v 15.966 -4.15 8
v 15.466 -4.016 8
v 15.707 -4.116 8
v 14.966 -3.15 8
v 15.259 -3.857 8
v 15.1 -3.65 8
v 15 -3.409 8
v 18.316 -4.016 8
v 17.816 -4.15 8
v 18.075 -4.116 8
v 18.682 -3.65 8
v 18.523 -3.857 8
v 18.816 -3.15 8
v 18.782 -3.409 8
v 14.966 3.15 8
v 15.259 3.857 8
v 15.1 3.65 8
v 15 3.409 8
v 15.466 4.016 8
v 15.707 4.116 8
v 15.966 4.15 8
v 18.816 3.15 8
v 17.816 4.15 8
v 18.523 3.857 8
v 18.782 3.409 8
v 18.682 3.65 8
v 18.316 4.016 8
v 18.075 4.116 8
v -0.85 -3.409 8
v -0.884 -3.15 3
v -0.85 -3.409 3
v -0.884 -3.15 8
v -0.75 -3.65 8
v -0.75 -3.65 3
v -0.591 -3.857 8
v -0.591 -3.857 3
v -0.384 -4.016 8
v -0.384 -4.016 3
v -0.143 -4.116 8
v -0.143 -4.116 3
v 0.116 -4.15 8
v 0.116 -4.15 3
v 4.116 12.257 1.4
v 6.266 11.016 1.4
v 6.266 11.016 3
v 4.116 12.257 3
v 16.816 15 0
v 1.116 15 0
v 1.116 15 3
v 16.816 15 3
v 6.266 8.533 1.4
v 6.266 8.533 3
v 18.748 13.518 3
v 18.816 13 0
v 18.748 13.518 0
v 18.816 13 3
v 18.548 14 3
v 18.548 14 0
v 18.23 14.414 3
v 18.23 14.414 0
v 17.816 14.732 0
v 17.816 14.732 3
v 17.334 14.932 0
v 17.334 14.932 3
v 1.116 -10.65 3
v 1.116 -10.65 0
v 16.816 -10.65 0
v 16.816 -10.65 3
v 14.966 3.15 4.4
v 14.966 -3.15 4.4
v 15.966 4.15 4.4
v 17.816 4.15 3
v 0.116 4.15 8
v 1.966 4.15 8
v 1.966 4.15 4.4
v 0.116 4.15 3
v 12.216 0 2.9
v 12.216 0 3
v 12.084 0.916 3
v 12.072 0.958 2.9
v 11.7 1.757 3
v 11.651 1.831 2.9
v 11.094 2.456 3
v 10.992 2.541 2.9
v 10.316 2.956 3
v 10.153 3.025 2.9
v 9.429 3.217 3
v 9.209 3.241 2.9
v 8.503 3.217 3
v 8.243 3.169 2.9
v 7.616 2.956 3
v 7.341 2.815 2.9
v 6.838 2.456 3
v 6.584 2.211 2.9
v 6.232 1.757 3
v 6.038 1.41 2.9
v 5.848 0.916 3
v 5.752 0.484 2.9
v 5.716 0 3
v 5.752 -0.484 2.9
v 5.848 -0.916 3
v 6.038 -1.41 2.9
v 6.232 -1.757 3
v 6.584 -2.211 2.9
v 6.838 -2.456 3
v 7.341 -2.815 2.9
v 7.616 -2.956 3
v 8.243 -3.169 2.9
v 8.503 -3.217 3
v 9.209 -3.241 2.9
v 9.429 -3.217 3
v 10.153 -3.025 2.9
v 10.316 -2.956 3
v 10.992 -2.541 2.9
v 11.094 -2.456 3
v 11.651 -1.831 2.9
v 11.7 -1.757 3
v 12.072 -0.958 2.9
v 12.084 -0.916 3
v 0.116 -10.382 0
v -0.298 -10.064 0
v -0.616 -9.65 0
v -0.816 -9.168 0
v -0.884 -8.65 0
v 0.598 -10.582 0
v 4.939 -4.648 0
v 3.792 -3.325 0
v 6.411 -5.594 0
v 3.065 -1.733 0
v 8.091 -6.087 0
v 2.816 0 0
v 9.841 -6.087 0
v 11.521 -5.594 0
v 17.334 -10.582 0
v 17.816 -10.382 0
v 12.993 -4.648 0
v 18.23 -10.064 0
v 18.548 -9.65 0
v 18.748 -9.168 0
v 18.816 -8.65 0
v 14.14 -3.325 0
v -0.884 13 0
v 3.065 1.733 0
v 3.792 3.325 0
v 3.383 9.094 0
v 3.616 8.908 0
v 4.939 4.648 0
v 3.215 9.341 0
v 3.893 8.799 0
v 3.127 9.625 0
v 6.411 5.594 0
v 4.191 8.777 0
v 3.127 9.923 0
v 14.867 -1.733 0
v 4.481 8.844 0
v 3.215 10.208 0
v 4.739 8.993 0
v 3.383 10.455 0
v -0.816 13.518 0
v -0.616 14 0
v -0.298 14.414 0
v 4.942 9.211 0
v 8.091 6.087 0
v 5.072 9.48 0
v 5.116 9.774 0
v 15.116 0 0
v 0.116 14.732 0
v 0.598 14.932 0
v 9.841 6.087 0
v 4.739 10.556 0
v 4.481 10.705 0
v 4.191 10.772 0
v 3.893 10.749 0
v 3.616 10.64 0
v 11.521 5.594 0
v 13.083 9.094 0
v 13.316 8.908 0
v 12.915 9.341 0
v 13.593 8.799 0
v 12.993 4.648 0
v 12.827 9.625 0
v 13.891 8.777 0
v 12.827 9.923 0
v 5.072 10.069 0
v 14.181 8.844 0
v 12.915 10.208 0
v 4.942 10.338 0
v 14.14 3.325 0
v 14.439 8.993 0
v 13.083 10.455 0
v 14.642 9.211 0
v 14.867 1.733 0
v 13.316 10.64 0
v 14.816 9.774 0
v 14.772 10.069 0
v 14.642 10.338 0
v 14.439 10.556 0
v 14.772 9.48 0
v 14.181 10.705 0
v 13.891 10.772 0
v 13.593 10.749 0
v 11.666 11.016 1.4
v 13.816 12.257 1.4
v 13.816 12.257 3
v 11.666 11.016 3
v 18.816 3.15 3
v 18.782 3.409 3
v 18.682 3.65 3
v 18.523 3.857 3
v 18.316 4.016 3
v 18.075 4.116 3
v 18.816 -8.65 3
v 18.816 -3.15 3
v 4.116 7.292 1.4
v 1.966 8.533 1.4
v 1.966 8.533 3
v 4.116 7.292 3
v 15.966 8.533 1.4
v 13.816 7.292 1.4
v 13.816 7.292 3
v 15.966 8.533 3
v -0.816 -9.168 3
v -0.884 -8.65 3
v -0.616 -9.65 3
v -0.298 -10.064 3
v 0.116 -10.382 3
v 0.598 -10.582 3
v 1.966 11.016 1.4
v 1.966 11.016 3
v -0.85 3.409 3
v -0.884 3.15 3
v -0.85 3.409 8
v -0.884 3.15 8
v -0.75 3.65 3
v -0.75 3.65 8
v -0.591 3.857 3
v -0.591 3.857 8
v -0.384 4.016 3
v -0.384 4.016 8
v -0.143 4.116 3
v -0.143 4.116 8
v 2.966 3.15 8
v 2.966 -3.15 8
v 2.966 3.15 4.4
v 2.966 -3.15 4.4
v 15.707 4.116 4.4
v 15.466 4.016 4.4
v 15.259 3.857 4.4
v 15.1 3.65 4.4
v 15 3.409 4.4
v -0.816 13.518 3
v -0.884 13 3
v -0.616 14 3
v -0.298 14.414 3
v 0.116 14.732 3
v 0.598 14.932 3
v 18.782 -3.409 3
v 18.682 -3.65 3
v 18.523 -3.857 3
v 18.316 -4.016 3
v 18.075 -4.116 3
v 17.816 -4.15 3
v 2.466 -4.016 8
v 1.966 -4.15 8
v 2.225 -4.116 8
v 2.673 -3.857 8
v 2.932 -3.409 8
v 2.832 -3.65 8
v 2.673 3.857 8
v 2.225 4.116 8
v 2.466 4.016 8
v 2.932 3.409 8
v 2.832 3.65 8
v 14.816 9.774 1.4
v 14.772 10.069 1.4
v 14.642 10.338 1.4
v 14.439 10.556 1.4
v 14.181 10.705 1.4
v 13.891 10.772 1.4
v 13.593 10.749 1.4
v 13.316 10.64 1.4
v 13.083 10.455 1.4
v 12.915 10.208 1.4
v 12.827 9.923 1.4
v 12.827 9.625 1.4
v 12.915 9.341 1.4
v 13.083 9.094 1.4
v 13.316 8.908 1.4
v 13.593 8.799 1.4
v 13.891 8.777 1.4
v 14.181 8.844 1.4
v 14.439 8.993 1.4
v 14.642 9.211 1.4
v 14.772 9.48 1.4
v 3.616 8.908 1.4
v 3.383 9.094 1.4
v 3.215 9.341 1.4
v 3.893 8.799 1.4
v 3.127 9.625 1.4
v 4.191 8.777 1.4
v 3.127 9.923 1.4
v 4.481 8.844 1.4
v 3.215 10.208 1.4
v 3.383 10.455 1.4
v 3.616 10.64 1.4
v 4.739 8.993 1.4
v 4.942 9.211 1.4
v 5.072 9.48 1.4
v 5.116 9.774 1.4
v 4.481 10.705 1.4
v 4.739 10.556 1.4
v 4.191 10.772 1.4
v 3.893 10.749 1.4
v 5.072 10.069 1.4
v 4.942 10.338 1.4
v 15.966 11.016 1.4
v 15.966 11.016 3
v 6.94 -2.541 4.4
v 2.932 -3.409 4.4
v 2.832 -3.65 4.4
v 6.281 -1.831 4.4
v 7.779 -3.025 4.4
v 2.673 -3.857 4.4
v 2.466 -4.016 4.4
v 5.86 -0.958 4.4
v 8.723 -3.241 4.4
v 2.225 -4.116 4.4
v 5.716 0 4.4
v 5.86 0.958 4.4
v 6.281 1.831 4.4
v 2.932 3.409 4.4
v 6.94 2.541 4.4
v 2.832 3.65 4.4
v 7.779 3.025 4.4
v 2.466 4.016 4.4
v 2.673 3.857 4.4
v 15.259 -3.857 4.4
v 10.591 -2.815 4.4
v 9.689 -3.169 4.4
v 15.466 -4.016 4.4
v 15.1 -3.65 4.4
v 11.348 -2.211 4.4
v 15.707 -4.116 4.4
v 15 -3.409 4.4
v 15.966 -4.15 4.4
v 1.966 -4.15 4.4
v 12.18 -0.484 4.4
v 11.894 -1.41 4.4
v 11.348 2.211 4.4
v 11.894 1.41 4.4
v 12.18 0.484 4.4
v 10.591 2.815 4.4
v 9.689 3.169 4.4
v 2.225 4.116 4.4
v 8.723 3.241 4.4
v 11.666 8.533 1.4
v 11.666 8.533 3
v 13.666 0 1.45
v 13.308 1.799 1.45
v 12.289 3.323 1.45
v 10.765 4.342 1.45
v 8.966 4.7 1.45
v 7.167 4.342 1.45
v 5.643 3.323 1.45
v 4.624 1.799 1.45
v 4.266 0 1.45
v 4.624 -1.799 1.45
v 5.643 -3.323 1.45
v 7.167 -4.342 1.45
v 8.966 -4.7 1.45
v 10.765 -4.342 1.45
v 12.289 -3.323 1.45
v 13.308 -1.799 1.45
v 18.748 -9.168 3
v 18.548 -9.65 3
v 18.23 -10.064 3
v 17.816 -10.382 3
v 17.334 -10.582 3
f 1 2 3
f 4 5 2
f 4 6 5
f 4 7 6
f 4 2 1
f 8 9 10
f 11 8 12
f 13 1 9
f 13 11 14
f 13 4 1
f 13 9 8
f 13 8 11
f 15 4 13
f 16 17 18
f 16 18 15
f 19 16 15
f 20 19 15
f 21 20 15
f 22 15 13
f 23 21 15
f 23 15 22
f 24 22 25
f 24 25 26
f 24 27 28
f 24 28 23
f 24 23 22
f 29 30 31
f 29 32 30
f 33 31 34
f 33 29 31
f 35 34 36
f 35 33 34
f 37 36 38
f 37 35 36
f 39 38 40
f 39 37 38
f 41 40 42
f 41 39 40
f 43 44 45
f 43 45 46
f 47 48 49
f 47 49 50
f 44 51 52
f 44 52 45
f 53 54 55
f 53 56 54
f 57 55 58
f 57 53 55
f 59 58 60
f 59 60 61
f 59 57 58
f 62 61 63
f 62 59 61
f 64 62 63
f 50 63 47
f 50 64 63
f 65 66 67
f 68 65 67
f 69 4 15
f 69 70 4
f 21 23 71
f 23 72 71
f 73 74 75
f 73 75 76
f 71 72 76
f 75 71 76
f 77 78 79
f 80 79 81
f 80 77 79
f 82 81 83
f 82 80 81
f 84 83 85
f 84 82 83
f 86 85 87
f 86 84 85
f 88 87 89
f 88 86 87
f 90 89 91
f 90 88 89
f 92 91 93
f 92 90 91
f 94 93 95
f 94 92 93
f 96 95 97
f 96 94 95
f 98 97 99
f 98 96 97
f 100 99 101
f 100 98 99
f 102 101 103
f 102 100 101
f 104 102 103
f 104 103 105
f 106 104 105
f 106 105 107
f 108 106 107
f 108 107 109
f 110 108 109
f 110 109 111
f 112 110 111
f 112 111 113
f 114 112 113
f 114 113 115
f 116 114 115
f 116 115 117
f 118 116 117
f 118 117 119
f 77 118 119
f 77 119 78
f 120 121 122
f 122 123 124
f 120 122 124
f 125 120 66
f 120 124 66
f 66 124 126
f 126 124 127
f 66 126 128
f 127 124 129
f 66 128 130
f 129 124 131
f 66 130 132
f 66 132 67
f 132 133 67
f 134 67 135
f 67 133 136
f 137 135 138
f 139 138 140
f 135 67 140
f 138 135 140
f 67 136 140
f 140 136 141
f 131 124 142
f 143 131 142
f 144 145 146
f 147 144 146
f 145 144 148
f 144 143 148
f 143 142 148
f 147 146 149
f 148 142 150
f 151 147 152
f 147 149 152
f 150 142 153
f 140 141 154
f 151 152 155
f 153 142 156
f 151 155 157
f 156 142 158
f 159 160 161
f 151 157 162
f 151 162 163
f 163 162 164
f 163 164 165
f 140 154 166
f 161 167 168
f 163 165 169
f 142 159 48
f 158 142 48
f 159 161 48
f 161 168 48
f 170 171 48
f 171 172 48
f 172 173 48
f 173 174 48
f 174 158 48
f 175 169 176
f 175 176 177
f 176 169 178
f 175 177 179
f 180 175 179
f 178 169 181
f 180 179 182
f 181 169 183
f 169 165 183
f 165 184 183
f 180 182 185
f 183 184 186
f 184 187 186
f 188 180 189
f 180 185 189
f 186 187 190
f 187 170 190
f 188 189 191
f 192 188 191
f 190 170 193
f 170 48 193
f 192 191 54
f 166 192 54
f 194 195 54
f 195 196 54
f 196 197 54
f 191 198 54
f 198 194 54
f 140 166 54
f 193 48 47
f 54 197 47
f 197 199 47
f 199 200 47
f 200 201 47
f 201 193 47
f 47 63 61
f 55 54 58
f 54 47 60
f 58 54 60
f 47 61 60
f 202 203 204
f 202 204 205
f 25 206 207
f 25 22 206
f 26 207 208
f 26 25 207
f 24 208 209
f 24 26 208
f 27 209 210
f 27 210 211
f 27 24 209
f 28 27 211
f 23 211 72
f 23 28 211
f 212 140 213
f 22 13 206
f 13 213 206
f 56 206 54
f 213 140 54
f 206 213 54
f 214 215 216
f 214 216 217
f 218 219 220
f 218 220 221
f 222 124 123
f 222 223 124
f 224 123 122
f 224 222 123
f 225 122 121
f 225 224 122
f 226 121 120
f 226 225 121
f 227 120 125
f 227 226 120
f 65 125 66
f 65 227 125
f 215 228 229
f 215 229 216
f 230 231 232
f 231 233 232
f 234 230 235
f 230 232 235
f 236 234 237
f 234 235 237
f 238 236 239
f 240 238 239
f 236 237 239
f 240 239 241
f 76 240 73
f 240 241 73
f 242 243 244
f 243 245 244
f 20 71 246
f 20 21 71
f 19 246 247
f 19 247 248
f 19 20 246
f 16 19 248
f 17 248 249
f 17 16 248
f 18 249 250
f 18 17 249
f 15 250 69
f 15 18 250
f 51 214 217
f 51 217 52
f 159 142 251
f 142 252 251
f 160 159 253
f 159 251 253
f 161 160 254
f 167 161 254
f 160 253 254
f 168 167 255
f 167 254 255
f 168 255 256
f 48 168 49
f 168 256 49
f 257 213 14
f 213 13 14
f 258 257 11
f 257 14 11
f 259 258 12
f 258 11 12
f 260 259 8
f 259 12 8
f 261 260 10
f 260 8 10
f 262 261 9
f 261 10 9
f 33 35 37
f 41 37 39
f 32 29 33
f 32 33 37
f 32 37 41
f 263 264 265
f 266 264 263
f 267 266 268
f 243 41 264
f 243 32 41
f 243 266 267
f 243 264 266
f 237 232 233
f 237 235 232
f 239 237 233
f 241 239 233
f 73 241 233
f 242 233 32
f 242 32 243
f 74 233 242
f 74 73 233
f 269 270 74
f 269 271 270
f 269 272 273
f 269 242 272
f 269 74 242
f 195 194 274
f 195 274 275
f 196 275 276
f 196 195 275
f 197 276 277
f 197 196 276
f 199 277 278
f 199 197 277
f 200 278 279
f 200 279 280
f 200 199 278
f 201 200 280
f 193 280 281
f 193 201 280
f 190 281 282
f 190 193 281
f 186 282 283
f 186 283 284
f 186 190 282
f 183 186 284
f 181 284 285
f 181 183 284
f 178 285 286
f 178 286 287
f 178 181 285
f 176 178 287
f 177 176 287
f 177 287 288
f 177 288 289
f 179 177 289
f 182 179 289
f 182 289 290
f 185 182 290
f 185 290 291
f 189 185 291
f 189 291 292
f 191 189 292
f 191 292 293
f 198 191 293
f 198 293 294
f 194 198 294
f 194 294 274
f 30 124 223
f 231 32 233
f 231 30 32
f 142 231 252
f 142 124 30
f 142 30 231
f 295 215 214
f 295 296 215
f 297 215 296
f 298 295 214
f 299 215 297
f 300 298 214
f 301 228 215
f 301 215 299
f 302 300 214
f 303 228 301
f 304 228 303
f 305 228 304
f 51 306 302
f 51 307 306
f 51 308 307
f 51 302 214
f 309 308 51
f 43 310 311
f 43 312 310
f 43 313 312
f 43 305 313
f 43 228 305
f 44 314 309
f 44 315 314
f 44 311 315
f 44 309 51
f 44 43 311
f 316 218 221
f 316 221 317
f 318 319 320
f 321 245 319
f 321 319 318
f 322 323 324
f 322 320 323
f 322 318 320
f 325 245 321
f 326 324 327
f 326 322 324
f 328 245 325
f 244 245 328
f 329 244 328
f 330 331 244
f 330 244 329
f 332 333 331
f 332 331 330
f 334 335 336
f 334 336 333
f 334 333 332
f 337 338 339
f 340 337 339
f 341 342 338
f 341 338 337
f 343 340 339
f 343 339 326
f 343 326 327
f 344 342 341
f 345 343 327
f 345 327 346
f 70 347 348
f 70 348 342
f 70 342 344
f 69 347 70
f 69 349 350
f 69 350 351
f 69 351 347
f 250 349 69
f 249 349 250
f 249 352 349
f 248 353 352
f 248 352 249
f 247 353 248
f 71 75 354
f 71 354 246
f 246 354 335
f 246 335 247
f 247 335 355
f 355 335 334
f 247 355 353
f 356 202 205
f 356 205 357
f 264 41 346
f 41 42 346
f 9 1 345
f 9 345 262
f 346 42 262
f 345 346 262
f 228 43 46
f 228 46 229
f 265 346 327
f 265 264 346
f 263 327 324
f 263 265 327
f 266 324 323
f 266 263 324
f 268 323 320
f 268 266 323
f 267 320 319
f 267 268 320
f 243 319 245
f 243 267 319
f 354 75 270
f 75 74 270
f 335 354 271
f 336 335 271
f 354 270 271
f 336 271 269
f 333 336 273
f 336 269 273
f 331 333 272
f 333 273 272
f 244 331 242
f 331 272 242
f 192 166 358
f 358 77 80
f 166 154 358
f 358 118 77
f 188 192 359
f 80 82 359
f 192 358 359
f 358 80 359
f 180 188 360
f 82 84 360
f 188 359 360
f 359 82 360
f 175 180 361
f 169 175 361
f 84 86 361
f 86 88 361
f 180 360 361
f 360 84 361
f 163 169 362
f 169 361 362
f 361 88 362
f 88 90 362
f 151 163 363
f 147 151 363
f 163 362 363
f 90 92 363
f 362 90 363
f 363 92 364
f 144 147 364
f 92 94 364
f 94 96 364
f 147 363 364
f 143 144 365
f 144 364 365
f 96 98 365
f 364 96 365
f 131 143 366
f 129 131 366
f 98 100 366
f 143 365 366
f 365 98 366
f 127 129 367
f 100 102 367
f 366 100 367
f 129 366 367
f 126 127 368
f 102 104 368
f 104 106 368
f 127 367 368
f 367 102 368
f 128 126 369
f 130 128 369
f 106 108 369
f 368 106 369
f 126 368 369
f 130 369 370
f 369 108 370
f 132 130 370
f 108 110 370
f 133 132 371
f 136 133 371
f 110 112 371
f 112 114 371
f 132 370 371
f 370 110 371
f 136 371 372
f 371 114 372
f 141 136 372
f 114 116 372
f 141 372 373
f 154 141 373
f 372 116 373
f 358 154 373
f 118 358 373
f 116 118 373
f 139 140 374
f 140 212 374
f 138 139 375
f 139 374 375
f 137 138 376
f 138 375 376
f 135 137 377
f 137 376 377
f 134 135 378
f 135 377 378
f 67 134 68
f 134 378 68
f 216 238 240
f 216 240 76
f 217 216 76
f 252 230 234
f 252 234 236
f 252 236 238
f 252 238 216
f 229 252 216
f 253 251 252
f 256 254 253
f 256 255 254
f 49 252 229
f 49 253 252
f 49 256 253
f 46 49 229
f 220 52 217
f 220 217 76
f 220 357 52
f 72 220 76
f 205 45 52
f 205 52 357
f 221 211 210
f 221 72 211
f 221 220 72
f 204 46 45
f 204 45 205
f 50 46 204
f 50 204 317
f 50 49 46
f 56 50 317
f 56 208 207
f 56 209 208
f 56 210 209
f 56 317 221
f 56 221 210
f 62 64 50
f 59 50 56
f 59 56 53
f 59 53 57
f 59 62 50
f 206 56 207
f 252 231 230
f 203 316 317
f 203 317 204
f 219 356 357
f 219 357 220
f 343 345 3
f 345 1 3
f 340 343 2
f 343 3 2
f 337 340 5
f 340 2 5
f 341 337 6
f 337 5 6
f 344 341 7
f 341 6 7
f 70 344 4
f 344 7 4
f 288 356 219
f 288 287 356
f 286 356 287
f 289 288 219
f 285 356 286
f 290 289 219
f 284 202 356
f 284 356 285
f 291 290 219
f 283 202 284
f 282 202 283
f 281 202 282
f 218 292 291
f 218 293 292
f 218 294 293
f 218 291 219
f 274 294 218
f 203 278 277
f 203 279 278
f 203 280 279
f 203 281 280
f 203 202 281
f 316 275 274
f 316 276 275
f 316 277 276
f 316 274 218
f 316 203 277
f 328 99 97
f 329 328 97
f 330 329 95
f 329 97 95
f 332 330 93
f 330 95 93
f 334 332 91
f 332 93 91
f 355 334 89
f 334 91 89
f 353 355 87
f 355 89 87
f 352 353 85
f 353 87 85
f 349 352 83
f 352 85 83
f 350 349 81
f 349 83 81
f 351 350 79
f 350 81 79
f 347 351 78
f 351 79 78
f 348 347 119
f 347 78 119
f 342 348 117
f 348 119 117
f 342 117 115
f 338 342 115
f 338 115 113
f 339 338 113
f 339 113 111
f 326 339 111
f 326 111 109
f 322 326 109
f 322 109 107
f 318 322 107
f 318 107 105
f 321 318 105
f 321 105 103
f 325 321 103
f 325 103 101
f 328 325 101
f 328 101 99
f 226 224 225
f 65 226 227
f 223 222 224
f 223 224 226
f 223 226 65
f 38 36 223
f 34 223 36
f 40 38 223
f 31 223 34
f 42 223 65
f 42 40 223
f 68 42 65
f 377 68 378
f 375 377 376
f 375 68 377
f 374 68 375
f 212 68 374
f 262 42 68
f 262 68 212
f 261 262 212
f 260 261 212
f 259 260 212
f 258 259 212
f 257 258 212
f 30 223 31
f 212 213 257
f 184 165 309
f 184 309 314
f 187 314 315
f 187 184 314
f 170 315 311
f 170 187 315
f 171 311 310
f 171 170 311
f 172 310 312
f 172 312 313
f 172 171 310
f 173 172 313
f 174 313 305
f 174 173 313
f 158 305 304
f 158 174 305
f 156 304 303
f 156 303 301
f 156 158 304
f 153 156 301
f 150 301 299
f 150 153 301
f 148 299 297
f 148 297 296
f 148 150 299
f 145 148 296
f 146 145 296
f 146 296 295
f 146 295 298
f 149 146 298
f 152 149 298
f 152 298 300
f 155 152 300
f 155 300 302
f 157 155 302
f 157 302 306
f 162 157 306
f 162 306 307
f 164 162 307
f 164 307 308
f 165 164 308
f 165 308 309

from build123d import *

# Parameters (mm, degrees)
SKETCH_1_W          = 19.7
SKETCH_1_H          = 25.65
SKETCH_1_R          = 3.25
SKETCH_1_R_2        = 1
EXTRUDE_1_DEPTH     = 3
SKETCH_1_3_W        = 3.85
SKETCH_1_3_H        = 8.3
EXTRUDE_2_DEPTH     = 8
FILLET_1_R          = 2
CHAMFER_1_SIZE      = 2.9
FILLET_2_R          = 1
EXTRUDE_START       = 3
EXTRUDE_4_DEPTH     = 1.4
FILLET_3_R          = 1
CUT_EXTRUDE_START   = 1.4
SKETCH_1_5_R        = 1
CUT_EXTRUDE_1_DEPTH = 1.6


with BuildPart() as part:
    # Эскиз1 → Бобышка-Вытянуть1 (new body)
    with BuildSketch(Plane.XY):
        with Locations((8.965987089, 2.175)):
            Rectangle(SKETCH_1_W, SKETCH_1_H)
        with Locations((8.965987089, 0)):
            Circle(SKETCH_1_R, mode=Mode.SUBTRACT)
        with Locations((4.115987089, 9.774393406)):
            Circle(SKETCH_1_R_2, mode=Mode.SUBTRACT)
        with Locations((13.815987089, 9.774393406)):
            Circle(SKETCH_1_R_2, mode=Mode.SUBTRACT)
    extrude(amount=EXTRUDE_1_DEPTH)

    # Эскиз1<3> → Бобышка-Вытянуть2 (add)
    with BuildSketch(Plane.XY):
        with Locations((1.040987089, 0)):
            Rectangle(SKETCH_1_3_W, SKETCH_1_3_H)
        with Locations((16.890987089, 0)):
            Rectangle(SKETCH_1_3_W, SKETCH_1_3_H)
    extrude(amount=EXTRUDE_2_DEPTH)

    # Скругление1
    fillet_1_edges = [part.edges().sort_by_distance(p)[0] for p in [
        (-0.884012911, -10.65, 1.5),
        (-0.884012911, 15, 1.5),
        (18.815987089, 15, 1.5),
        (18.815987089, -10.65, 1.5),
    ]]
    fillet(fillet_1_edges, radius=FILLET_1_R)

    # Фаска1
    chamfer_1_edges = [part.edges().sort_by_distance(p)[0] for p in [
        (5.715987089, 0, 0),
    ]]
    chamfer(chamfer_1_edges, length=CHAMFER_1_SIZE)

    # Скругление2
    fillet_2_edges = [part.edges().sort_by_distance(p)[0] for p in [
        (-0.884012911, 4.15, 5.5),
        (-0.884012911, -4.15, 5.5),
        (18.815987089, -4.15, 5.5),
        (18.815987089, 4.15, 5.5),
    ]]
    fillet(fillet_2_edges, radius=FILLET_2_R)

    # Эскиз1<4> → Бобышка-Вытянуть4 (add)
    with BuildSketch(Plane.XY.offset(EXTRUDE_START)):
        with BuildLine():
            Line((2.965987089, 0), (2.965987089, -4.15))
            Line((2.965987089, -4.15), (14.965987089, -4.15))
            Line((14.965987089, -4.15), (14.965987089, 0))
            Line((14.965987089, 0), (12.215987089, 0))
            ThreePointArc((12.215987089, 0), (8.965987089, -3.25), (5.715987089, 0))
            Line((5.715987089, 0), (2.965987089, 0))
        make_face()
        with BuildLine():
            Line((14.965987089, 4.15), (2.965987089, 4.15))
            Line((2.965987089, 4.15), (2.965987089, 0))
            Line((2.965987089, 0), (5.715987089, 0))
            ThreePointArc((5.715987089, 0), (8.965987089, 3.25), (12.215987089, 0))
            Line((12.215987089, 0), (14.965987089, 0))
            Line((14.965987089, 0), (14.965987089, 4.15))
        make_face()
    extrude(amount=EXTRUDE_4_DEPTH)

    # Скругление3
    fillet_3_edges = [part.edges().sort_by_distance(p)[0] for p in [
        (2.965987089, -4.15, 6.2),
        (2.965987089, 4.15, 6.2),
        (14.965987089, -4.15, 6.2),
        (14.965987089, 4.15, 6.2),
    ]]
    fillet(fillet_3_edges, radius=FILLET_3_R)

    # Эскиз1<5> → Вырез-Вытянуть1 (cut)
    with BuildSketch(Plane.XY.offset(CUT_EXTRUDE_START)):
        Polygon((6.265987089, 8.533090327), (6.265987089, 11.015696485), (4.115987089, 12.256999563), (1.965987089, 11.015696485), (1.965987089, 8.533090327), (4.115987089, 7.291787248), align=None)
        with Locations((4.115987089, 9.774393406)):
            Circle(SKETCH_1_5_R, mode=Mode.SUBTRACT)
        Polygon((15.965987089, 8.533090327), (15.965987089, 11.015696485), (13.815987089, 12.256999563), (11.665987089, 11.015696485), (11.665987089, 8.533090327), (13.815987089, 7.291787248), align=None)
        with Locations((13.815987089, 9.774393406)):
            Circle(SKETCH_1_5_R, mode=Mode.SUBTRACT)
    extrude(amount=CUT_EXTRUDE_1_DEPTH, mode=Mode.SUBTRACT)


solid = part.part
